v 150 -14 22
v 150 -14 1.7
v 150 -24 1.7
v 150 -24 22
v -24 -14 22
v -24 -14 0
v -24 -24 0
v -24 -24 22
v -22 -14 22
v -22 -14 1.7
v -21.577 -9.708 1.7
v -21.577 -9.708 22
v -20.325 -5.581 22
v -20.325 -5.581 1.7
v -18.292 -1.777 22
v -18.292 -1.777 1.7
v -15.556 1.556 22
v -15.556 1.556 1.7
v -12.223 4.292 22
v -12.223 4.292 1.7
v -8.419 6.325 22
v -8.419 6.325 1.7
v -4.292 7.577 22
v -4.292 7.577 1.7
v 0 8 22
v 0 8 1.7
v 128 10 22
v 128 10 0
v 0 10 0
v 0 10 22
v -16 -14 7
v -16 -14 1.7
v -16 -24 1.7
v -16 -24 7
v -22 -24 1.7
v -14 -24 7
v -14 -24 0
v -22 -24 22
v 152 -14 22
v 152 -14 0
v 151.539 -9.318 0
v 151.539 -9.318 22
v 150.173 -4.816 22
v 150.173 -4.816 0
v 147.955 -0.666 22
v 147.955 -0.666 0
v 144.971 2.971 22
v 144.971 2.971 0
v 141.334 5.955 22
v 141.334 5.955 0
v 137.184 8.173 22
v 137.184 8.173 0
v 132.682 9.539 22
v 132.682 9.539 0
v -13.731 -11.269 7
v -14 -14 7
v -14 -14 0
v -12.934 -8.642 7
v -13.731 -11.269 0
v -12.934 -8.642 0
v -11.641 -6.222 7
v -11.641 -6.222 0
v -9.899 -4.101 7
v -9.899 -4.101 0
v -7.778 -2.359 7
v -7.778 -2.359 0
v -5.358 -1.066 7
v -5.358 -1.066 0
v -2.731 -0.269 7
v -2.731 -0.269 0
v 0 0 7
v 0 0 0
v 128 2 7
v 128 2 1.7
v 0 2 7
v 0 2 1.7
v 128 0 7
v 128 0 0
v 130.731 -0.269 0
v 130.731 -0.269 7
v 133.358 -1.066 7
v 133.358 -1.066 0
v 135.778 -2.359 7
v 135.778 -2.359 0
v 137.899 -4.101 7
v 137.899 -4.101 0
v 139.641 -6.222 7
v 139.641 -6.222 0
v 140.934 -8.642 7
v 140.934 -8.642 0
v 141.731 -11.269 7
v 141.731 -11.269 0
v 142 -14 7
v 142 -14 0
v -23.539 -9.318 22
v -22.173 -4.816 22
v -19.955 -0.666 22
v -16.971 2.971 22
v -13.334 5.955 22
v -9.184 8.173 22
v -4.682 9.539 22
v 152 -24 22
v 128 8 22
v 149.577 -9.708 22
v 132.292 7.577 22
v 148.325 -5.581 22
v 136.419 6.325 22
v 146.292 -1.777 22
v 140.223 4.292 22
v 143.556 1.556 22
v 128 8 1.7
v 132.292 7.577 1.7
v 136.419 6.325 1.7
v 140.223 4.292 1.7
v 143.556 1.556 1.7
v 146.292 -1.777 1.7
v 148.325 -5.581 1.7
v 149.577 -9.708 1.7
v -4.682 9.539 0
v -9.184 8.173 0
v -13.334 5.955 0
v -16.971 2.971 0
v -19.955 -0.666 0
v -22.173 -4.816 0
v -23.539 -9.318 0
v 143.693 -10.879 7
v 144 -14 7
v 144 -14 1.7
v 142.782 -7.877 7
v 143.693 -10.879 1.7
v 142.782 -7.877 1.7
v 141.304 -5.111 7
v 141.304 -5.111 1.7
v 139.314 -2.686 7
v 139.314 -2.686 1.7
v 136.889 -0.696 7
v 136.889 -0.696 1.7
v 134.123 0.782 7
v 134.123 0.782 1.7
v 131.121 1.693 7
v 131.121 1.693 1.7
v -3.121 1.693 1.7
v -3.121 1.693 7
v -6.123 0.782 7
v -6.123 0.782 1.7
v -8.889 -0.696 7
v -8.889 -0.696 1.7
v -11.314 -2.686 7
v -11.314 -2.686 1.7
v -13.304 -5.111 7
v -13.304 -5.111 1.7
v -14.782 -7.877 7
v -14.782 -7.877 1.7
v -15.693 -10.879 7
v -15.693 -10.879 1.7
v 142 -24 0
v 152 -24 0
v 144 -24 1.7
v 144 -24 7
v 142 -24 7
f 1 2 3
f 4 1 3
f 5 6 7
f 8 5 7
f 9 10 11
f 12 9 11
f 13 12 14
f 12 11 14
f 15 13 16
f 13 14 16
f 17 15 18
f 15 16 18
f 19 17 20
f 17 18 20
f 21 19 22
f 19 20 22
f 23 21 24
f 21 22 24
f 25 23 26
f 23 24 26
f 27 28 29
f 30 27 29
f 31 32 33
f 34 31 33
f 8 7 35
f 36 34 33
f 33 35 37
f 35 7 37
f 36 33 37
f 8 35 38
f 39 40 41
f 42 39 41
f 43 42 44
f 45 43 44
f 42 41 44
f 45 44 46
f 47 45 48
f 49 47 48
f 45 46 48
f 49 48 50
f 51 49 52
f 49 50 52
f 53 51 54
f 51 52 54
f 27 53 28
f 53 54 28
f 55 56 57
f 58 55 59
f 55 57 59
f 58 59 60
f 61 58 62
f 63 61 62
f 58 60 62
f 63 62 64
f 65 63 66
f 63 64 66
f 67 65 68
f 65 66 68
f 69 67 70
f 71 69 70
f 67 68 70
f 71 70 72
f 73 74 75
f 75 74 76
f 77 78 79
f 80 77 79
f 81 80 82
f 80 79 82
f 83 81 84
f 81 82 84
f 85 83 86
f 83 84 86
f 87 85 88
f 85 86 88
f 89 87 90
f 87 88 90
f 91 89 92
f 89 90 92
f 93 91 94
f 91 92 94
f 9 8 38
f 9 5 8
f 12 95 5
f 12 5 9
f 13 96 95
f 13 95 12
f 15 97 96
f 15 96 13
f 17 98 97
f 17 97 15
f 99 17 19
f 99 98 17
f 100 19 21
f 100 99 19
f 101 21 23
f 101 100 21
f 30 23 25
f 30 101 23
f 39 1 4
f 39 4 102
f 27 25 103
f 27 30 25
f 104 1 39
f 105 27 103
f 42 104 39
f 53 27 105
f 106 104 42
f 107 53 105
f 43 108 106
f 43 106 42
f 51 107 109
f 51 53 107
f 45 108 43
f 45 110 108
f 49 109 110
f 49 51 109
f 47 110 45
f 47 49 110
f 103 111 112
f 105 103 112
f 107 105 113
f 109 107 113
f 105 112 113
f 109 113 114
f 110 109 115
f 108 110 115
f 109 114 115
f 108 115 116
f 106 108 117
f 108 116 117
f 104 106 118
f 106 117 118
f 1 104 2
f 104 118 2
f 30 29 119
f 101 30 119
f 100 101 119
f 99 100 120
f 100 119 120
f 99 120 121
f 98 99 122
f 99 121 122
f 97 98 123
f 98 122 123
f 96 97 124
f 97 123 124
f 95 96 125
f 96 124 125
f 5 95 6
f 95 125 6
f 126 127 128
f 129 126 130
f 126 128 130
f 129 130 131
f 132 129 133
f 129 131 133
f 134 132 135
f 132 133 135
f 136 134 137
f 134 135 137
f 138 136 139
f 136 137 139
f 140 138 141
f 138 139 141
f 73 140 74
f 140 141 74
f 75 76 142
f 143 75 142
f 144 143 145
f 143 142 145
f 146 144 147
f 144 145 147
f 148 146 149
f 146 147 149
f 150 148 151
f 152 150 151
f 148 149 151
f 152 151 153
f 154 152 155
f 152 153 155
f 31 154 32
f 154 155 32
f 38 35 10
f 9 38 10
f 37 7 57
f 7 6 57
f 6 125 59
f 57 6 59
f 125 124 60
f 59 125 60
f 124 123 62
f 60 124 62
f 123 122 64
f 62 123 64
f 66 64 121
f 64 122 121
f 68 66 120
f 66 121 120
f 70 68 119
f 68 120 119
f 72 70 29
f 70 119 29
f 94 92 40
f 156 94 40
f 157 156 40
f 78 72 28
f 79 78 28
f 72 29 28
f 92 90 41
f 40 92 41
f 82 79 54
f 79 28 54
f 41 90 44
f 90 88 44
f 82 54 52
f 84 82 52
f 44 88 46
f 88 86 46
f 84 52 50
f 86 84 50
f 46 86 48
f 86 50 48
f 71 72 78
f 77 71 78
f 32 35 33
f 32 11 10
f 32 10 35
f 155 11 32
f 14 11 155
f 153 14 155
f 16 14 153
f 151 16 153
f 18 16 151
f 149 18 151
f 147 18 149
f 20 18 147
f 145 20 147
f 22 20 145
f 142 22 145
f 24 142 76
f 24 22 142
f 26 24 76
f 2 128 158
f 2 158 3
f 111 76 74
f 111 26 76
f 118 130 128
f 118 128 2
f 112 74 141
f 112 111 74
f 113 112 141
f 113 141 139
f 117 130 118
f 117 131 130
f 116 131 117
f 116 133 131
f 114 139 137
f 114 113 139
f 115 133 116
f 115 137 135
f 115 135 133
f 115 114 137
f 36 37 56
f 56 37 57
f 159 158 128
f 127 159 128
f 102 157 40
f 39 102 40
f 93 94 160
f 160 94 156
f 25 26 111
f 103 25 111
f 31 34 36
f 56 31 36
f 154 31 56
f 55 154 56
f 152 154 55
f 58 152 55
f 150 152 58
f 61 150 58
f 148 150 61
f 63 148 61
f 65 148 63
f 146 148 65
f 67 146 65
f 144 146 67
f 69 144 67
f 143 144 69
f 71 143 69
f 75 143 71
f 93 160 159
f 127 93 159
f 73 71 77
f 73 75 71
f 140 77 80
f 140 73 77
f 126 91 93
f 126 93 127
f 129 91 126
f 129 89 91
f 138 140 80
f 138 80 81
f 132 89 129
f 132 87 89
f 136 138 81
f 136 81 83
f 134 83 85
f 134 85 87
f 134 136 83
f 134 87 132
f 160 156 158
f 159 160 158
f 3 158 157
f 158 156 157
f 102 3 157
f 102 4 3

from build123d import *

# Parameters (mm, degrees)
F1_DEPTH = 1.7
F2_DEPTH = 7
F3_DEPTH = 22


with BuildPart() as f1:
    # F0 (on Top) → F1 (new body)
    with BuildSketch(Plane.XY):
        with BuildLine():
            Line((-22, -24), (-16, -24))
            Line((-16, -24), (-16, -14))
            ThreePointArc((-16, -14), (-11.313708, -2.686292), (0, 2))
            Line((0, 2), (128, 2))
            ThreePointArc((128, 2), (139.313708, -2.686292), (144, -14))
            Line((144, -14), (144, -24))
            Line((144, -24), (150, -24))
            Line((150, -24), (150, -14))
            ThreePointArc((150, -14), (143.556349, 1.556349), (128, 8))
            Line((128, 8), (0, 8))
            ThreePointArc((0, 8), (-15.556349, 1.556349), (-22, -14))
            Line((-22, -14), (-22, -24))
        make_face()
    extrude(amount=F1_DEPTH)

    # F0 (on Top) → F2 (join)
    with BuildSketch(Plane.XY):
        with BuildLine():
            ThreePointArc((-14, -14), (-9.899495, -4.100505), (0, 0))
            Line((0, 0), (128, 0))
            ThreePointArc((128, 0), (137.899495, -4.100505), (142, -14))
            Line((142, -14), (142, -24))
            Line((142, -24), (144, -24))
            Line((144, -24), (144, -14))
            ThreePointArc((144, -14), (139.313708, -2.686292), (128, 2))
            Line((128, 2), (0, 2))
            ThreePointArc((0, 2), (-11.313708, -2.686292), (-16, -14))
            Line((-16, -14), (-16, -24))
            Line((-16, -24), (-14, -24))
            Line((-14, -24), (-14, -14))
        make_face()
    extrude(amount=F2_DEPTH)

    # F0 (on Top) → F3 (join)
    with BuildSketch(Plane.XY):
        with BuildLine():
            Line((-24, -24), (-22, -24))
            Line((-22, -24), (-22, -14))
            ThreePointArc((-22, -14), (-15.556349, 1.556349), (0, 8))
            Line((0, 8), (128, 8))
            ThreePointArc((128, 8), (143.556349, 1.556349), (150, -14))
            Line((150, -14), (150, -24))
            Line((150, -24), (152, -24))
            Line((152, -24), (152, -14))
            ThreePointArc((152, -14), (144.970563, 2.970563), (128, 10))
            Line((128, 10), (0, 10))
            ThreePointArc((0, 10), (-16.970563, 2.970563), (-24, -14))
            Line((-24, -14), (-24, -24))
        make_face()
    extrude(amount=F3_DEPTH)


solid = f1.part
